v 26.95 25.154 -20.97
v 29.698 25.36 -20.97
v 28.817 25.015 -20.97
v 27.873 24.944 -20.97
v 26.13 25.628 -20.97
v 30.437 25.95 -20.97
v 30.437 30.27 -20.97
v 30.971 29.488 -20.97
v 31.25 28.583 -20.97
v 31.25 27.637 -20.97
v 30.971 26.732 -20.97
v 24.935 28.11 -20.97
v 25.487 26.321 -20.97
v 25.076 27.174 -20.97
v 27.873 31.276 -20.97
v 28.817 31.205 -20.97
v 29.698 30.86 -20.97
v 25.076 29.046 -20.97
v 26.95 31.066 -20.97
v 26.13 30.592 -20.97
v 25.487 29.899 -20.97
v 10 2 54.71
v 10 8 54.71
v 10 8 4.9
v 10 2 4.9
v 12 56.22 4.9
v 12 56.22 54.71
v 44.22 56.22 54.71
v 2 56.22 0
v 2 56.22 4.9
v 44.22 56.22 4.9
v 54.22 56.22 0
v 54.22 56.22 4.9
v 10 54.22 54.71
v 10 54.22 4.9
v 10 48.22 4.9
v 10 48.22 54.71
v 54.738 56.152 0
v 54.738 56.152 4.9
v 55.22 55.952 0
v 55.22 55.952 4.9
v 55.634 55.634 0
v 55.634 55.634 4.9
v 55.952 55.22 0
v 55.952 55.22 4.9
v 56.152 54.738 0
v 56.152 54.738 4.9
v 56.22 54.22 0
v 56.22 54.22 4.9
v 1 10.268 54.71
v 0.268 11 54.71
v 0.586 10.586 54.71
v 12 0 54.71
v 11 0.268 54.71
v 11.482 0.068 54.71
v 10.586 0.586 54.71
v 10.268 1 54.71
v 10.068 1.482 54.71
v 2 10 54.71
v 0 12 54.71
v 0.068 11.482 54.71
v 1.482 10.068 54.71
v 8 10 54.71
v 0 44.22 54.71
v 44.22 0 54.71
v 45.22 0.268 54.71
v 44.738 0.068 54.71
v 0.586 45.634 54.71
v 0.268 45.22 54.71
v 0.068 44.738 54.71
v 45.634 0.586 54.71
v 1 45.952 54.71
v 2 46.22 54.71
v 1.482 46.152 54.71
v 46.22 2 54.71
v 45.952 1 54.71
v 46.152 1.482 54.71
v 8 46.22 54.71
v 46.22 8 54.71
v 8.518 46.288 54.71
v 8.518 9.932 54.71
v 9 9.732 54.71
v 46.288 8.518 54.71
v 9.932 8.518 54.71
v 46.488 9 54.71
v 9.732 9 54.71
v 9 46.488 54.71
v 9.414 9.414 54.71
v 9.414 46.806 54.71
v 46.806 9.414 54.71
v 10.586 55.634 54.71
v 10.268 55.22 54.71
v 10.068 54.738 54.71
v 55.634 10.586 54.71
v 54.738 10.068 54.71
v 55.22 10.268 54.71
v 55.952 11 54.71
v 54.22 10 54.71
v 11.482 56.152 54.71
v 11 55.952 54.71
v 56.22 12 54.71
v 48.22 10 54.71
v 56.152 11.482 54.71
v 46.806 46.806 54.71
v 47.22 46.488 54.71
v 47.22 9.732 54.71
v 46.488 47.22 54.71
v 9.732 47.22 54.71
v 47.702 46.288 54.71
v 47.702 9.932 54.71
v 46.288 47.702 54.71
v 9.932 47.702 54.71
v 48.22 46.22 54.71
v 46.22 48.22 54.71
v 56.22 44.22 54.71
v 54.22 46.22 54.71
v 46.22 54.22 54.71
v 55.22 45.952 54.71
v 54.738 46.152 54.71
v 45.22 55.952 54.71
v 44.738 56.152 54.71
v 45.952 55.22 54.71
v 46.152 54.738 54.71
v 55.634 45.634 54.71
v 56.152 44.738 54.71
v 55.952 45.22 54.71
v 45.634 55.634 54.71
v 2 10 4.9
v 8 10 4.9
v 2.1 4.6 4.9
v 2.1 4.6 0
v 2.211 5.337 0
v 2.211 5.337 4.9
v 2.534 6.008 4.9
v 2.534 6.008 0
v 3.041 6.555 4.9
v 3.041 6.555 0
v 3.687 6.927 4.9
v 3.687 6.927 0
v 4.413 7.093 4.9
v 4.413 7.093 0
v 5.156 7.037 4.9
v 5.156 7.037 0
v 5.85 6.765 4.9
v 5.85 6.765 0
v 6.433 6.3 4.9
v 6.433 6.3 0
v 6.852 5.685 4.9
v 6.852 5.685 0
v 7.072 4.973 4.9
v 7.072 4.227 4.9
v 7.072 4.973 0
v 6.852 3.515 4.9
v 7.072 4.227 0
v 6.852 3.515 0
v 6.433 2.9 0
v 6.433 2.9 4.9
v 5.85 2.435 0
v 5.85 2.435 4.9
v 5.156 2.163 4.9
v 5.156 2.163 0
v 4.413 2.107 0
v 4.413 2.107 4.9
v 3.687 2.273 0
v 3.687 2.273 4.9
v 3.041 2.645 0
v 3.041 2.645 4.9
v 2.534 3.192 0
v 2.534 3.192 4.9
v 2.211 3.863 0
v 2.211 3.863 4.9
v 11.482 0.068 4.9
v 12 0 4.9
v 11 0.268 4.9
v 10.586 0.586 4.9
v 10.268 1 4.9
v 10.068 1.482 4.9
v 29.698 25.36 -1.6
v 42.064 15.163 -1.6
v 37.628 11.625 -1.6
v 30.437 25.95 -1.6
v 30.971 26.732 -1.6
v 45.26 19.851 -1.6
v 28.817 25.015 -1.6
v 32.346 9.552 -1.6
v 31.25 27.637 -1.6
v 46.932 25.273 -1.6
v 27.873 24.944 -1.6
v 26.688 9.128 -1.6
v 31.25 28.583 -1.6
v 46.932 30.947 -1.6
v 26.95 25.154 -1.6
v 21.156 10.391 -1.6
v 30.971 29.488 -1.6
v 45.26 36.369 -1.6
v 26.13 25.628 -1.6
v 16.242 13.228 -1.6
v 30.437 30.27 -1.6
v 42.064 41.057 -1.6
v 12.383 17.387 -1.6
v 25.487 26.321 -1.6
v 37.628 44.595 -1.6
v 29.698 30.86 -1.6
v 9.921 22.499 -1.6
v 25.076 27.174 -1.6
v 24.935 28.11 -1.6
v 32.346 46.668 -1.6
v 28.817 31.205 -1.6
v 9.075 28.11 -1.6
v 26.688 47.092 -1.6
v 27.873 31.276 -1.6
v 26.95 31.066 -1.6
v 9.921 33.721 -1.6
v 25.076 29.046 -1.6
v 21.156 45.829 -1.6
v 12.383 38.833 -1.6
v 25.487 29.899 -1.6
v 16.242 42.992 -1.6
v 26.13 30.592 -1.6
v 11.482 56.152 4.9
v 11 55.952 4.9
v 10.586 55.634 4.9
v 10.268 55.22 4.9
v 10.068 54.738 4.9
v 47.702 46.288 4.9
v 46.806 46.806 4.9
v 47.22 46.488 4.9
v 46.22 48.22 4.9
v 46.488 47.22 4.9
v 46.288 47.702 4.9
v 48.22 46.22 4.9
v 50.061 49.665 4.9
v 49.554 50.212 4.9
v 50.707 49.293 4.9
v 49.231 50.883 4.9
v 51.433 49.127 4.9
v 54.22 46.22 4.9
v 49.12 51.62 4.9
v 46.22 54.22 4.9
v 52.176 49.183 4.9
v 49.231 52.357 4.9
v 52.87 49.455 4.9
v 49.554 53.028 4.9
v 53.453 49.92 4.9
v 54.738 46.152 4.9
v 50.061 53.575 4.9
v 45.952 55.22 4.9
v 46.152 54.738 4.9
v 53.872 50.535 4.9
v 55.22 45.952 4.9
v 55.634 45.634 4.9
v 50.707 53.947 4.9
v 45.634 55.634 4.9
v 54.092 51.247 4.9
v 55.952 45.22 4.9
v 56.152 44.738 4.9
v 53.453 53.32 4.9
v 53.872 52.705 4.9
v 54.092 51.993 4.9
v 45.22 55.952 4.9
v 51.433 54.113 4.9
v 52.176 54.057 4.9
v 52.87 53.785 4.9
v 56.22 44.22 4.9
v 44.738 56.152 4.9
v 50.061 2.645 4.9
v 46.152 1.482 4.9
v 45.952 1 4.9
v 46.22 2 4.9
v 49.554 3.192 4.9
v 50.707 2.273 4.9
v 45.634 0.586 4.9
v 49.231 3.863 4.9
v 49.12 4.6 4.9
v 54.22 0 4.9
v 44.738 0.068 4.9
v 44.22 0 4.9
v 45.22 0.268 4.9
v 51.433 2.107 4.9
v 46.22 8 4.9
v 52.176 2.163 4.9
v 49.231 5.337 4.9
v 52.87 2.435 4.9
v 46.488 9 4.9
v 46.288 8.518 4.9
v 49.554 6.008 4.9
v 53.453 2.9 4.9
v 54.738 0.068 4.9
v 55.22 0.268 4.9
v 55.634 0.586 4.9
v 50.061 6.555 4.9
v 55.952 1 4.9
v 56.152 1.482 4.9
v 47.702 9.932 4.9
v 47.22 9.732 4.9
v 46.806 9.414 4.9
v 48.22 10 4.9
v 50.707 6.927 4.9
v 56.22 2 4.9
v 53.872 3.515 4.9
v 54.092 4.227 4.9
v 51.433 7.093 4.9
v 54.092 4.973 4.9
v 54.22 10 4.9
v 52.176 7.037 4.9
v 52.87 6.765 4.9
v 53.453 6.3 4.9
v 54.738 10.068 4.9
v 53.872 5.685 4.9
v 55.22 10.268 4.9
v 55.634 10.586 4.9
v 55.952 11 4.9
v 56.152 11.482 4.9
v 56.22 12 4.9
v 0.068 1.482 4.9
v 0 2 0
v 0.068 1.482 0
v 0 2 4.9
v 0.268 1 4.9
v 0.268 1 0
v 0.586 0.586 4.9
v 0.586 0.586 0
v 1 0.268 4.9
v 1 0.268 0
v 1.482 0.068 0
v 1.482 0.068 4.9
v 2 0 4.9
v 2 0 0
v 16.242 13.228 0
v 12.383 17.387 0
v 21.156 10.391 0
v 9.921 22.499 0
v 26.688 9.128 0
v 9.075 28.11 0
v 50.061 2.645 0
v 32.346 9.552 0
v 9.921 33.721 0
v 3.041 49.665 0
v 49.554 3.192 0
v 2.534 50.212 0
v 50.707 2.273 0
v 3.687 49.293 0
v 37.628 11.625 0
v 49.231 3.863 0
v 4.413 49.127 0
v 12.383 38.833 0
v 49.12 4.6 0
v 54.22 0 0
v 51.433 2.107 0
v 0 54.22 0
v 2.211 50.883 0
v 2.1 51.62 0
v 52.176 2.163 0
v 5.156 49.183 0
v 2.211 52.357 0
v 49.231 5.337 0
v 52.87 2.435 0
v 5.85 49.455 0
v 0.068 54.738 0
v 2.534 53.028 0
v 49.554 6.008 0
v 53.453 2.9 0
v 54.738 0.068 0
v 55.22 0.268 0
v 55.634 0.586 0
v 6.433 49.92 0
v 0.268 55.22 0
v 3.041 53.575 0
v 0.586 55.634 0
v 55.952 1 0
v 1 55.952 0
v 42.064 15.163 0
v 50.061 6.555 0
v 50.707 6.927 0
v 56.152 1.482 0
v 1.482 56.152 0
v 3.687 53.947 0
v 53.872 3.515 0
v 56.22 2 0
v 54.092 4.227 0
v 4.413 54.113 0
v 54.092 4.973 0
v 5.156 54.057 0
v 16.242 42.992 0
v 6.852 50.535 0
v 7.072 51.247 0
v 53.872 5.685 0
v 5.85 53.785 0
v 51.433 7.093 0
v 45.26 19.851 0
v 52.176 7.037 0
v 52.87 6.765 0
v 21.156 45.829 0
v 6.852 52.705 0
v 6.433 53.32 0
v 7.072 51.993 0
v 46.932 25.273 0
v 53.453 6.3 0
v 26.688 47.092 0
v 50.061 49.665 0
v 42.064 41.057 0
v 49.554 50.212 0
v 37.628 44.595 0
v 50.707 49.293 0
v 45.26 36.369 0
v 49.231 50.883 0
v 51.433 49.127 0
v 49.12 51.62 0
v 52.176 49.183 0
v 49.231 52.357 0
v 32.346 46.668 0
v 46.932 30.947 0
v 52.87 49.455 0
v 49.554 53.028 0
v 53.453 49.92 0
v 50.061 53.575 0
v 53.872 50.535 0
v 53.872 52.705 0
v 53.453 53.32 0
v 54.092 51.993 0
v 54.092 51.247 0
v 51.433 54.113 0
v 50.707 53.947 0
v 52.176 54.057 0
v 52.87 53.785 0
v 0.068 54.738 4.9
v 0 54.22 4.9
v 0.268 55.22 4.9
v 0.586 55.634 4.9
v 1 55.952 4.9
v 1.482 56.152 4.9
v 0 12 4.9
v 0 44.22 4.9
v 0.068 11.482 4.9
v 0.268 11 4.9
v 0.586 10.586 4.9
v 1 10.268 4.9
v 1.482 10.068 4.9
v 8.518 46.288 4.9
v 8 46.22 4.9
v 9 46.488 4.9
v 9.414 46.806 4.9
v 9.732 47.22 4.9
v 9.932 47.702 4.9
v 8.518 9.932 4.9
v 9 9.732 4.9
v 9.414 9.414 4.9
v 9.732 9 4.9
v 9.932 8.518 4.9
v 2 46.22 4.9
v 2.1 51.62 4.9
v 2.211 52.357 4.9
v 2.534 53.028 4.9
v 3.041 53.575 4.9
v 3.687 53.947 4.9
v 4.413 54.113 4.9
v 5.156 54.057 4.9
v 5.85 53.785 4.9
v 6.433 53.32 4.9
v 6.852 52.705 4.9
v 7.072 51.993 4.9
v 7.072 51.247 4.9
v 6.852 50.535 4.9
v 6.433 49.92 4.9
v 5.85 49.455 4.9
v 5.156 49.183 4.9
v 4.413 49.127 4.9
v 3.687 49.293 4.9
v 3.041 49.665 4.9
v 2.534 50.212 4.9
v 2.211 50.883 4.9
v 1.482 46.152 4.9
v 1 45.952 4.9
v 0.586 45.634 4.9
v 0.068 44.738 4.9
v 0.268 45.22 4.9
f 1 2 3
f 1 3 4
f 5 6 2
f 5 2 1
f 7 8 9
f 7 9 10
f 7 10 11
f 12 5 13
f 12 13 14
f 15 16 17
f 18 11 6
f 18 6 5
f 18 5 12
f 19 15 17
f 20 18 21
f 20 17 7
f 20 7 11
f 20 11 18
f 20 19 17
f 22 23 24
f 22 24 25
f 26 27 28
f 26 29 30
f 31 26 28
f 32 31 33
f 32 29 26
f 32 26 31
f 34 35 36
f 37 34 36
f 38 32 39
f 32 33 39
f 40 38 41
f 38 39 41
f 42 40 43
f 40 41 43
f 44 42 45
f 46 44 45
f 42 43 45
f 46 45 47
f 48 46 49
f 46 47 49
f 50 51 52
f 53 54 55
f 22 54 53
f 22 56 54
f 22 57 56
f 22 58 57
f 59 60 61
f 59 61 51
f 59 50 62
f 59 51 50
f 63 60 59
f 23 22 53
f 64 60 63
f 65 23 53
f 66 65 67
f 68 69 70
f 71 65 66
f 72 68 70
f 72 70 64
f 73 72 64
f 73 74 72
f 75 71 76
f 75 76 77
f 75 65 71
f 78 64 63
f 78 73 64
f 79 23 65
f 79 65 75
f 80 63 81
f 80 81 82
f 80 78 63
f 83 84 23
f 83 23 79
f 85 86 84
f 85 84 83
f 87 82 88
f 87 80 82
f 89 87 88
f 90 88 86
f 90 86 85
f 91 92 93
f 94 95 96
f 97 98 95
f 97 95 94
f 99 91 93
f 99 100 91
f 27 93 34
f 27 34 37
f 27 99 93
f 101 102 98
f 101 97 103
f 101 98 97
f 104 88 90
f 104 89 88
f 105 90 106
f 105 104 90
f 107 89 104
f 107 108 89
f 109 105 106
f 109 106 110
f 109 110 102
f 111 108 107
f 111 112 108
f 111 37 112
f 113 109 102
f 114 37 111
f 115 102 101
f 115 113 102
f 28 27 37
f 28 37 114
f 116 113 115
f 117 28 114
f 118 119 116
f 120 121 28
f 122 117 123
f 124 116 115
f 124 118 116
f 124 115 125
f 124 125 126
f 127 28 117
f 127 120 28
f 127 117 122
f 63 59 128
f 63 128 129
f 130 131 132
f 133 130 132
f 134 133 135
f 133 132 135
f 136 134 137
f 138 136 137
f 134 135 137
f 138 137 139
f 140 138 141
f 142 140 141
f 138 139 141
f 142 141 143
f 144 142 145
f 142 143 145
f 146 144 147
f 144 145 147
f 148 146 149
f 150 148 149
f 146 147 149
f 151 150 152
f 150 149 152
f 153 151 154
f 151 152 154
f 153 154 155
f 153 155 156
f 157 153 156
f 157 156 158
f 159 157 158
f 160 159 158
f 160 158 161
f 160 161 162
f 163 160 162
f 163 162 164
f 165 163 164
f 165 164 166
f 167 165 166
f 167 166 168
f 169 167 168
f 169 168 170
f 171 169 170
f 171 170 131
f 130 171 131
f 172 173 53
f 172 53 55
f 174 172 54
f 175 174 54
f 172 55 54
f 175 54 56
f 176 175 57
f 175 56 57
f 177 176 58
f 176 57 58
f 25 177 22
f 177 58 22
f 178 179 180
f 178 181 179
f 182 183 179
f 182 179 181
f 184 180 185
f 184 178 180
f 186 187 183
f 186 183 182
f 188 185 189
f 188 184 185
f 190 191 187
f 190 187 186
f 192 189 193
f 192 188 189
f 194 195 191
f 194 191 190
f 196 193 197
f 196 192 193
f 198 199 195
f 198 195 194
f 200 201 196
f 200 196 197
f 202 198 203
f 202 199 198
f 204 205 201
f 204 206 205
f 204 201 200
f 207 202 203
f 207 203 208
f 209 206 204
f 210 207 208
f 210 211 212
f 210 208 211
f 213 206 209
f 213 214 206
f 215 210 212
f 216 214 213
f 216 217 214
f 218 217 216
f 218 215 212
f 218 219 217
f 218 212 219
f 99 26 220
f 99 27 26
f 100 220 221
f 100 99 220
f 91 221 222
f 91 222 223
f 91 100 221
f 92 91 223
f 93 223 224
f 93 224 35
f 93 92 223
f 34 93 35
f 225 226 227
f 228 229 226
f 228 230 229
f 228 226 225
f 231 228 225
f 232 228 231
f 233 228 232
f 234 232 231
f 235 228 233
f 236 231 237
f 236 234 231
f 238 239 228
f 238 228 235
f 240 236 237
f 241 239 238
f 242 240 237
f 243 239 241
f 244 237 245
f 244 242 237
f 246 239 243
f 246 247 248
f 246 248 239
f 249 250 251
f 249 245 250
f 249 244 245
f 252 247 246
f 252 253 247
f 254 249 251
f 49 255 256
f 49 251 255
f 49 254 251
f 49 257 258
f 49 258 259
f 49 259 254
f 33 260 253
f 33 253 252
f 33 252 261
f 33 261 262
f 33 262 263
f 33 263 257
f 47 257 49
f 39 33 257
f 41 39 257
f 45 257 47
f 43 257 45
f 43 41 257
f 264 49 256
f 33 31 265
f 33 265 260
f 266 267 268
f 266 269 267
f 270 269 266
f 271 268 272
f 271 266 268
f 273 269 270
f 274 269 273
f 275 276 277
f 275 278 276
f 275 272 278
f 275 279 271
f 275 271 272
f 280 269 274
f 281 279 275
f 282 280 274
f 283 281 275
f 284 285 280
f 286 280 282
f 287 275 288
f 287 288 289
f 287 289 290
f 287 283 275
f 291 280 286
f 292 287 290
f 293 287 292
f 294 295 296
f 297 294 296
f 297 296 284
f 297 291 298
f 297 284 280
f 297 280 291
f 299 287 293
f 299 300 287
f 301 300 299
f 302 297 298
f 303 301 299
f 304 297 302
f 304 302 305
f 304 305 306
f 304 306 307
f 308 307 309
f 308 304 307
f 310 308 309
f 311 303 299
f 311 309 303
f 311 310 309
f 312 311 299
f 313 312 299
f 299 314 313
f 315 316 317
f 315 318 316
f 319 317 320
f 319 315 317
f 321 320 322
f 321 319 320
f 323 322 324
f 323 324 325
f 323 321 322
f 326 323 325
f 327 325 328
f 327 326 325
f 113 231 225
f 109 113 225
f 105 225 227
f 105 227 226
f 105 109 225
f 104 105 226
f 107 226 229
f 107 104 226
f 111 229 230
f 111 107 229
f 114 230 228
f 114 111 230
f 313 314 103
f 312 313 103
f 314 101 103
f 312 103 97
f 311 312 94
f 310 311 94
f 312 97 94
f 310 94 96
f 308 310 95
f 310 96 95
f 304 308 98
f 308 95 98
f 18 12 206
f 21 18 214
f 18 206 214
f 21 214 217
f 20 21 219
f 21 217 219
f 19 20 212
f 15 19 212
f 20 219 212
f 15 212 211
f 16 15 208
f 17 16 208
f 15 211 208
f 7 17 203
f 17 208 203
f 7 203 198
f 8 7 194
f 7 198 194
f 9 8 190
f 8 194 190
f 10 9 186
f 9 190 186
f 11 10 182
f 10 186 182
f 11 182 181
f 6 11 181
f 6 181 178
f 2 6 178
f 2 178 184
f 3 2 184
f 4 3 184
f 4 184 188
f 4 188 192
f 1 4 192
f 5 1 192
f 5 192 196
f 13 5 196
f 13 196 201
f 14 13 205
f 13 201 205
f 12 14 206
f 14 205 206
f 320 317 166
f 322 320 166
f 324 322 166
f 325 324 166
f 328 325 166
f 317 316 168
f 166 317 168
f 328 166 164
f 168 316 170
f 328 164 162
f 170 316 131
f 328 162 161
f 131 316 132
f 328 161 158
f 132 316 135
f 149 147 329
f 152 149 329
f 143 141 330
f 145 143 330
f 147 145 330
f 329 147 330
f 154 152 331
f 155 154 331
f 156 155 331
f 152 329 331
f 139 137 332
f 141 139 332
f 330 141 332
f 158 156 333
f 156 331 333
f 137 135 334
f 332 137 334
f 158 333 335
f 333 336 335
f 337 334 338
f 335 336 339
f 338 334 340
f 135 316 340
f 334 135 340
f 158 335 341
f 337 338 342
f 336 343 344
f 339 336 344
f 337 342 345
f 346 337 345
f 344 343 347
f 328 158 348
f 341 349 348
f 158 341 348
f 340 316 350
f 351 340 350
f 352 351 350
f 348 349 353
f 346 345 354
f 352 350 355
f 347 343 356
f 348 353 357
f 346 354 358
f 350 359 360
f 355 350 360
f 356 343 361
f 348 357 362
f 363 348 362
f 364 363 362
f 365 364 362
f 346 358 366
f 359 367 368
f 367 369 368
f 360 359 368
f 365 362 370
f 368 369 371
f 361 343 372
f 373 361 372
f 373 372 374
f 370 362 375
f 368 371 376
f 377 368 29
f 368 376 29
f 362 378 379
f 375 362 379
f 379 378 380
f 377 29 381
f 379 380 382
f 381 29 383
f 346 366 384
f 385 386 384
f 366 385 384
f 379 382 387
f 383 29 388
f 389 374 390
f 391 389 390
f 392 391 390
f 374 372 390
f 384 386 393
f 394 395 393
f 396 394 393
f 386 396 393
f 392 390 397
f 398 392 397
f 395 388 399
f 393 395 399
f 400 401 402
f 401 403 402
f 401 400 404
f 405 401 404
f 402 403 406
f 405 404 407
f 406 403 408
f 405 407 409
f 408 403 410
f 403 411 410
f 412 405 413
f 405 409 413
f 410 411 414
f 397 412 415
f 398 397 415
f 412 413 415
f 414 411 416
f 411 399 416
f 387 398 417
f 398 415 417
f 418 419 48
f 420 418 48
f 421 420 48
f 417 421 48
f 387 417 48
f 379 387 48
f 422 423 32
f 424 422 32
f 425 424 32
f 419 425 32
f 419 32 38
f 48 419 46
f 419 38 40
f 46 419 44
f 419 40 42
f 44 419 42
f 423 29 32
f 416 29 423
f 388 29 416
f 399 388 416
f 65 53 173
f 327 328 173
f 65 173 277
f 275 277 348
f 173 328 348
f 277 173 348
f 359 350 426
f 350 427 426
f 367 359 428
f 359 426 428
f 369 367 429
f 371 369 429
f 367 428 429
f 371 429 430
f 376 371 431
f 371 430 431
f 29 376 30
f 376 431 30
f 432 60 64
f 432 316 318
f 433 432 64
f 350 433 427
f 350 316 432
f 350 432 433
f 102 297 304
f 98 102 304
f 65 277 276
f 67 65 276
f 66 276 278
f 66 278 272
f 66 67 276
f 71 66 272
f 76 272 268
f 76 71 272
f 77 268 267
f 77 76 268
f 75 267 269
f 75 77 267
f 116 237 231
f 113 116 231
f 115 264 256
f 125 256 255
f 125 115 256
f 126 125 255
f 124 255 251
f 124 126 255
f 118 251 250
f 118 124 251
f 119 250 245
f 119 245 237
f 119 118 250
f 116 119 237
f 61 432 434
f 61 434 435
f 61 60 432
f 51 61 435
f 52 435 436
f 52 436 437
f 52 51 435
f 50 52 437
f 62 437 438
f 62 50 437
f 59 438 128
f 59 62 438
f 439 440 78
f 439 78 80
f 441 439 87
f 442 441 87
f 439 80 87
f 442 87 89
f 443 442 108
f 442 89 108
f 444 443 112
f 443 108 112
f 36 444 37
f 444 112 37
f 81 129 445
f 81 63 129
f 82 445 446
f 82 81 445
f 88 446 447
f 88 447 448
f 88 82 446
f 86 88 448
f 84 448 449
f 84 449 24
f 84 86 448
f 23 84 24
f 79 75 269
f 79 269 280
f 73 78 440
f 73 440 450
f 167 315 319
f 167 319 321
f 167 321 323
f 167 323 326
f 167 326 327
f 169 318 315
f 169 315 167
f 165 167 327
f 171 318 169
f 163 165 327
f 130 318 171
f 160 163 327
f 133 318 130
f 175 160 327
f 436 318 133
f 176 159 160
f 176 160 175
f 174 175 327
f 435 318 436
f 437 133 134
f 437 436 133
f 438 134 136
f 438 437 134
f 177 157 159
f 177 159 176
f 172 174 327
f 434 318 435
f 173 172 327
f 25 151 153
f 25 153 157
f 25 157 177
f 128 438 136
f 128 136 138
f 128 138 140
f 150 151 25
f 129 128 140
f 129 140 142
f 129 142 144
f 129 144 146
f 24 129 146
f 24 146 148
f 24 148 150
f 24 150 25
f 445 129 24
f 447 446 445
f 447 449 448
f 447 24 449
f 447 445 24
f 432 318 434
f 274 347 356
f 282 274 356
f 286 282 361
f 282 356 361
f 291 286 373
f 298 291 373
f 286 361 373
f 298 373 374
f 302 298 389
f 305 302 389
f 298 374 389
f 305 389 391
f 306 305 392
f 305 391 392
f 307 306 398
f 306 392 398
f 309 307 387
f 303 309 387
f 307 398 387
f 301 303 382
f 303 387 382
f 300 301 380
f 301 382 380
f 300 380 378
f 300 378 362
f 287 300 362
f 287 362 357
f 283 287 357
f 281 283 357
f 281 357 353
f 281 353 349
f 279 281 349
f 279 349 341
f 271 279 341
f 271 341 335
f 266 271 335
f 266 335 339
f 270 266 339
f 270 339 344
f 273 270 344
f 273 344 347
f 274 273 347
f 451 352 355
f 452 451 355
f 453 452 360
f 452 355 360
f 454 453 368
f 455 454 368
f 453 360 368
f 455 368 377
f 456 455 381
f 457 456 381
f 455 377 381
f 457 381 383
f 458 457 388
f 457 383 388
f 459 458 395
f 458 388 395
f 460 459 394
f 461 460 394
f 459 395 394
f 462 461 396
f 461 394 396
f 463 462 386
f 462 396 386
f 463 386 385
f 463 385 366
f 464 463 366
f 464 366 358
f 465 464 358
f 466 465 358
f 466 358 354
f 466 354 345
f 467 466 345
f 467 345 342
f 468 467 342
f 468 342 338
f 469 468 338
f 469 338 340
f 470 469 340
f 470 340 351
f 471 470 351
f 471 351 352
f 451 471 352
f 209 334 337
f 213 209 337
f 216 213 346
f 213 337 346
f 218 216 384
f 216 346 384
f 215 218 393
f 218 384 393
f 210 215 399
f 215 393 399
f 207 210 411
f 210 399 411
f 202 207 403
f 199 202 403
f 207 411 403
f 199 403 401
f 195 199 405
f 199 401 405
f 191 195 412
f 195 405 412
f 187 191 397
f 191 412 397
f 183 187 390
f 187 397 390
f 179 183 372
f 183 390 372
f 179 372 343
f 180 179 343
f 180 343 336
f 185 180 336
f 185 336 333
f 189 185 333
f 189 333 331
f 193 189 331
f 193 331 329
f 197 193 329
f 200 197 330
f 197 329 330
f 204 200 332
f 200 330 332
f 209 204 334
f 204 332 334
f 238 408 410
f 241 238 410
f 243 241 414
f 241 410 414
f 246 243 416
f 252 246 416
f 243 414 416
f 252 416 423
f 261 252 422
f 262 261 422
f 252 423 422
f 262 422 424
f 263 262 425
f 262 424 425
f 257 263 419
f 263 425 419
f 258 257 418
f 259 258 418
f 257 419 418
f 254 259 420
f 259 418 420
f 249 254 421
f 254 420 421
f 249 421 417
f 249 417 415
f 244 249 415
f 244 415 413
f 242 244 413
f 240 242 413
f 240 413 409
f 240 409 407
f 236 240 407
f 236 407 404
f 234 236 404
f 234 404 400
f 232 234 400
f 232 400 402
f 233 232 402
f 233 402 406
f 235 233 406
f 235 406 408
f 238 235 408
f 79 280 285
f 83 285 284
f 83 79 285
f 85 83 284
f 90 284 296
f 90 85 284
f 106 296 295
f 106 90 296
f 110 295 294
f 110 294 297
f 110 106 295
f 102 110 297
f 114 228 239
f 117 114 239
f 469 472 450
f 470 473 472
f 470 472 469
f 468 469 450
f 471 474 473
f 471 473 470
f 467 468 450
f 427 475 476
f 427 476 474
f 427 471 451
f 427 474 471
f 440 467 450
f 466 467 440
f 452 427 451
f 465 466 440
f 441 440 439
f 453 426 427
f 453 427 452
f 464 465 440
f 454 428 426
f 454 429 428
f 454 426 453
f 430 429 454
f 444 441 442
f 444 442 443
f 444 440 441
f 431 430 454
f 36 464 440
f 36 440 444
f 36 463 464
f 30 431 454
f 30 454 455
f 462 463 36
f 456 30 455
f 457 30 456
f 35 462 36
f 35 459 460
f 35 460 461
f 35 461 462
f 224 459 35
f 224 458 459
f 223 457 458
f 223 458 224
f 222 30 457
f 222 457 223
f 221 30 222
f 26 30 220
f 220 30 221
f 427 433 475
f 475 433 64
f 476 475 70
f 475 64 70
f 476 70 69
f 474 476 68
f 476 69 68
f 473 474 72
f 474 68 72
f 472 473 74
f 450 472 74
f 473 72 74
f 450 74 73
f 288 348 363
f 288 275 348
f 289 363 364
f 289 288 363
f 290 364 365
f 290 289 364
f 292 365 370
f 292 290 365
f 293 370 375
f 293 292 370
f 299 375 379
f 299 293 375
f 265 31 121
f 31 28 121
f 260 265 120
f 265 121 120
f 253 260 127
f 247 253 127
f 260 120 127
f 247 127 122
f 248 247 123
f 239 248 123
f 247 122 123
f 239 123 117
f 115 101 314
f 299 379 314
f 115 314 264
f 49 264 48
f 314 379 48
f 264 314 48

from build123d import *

# Parameters (mm, degrees)
SKETCH1_W           = 56.22
SKETCH1_H           = 56.22
BOSS_EXTRUDE1_DEPTH = 4.9
SKETCH2_R           = 2.5
CUT_EXTRUDE1_DEPTH  = 5.9
FILLET1_R           = 2
BOSS_EXTRUDE2_DEPTH = 49.81
FILLET2_R           = 2
SKETCH5_R           = 19.035
BOSS_EXTRUDE3_DEPTH = 1.6
SKETCH6_R           = 3.175
BOSS_EXTRUDE4_DEPTH = 19.37


with BuildPart() as part:
    # Sketch1 → Boss-Extrude1 (new body)
    with BuildSketch(Plane.XY):
        with Locations((28.11, 28.11)):
            Rectangle(SKETCH1_W, SKETCH1_H)
    extrude(amount=BOSS_EXTRUDE1_DEPTH)

    # Sketch2 → Cut-Extrude1 (cut, through all)
    with BuildSketch(Plane(origin=(0, 0, 0), x_dir=(-1, 0, 0), z_dir=(0, 0, -1))):
        with Locations((-4.6, 51.62)):
            Circle(SKETCH2_R)
        with Locations((-51.62, 51.62)):
            Circle(SKETCH2_R)
        with Locations((-51.62, 4.6)):
            Circle(SKETCH2_R)
        with Locations((-4.6, 4.6)):
            Circle(SKETCH2_R)
    extrude(amount=-CUT_EXTRUDE1_DEPTH, mode=Mode.SUBTRACT)

    # Fillet1
    fillet1_edges = [part.edges().sort_by_distance(p)[0] for p in [
        (0, 56.22, 2.45),
        (56.22, 56.22, 2.45),
        (56.22, 0, 2.45),
        (0, 0, 2.45),
    ]]
    fillet(fillet1_edges, radius=FILLET1_R)

    # Sketch4 → Boss-Extrude2 (add)
    with BuildSketch(Plane.XY.offset(4.9)):
        Polygon((0, 46.22), (0, 28.11), (28.11, 28.11), (28.11, 56.22), (10, 56.22), (10, 46.22), align=None)
        Polygon((28.11, 56.22), (28.11, 28.11), (56.22, 28.11), (56.22, 46.22), (46.22, 46.22), (46.22, 56.22), align=None)
        Polygon((56.22, 28.11), (28.11, 28.11), (28.11, 0), (46.22, 0), (46.22, 10), (56.22, 10), align=None)
        Polygon((28.11, 28.11), (0, 28.11), (0, 10), (10, 10), (10, 0), (28.11, 0), align=None)
    extrude(amount=BOSS_EXTRUDE2_DEPTH)

    # Fillet2
    fillet2_edges = [part.edges().sort_by_distance(p)[0] for p in [
        (10, 0, 29.805),
        (46.22, 0, 29.805),
        (46.22, 10, 29.805),
        (56.22, 10, 29.805),
        (56.22, 46.22, 29.805),
        (46.22, 46.22, 29.805),
        (46.22, 56.22, 29.805),
        (10, 56.22, 29.805),
        (10, 46.22, 29.805),
        (0, 46.22, 29.805),
        (0, 10, 29.805),
        (10, 10, 29.805),
    ]]
    fillet(fillet2_edges, radius=FILLET2_R)

    # Sketch5 → Boss-Extrude3 (add)
    with BuildSketch(Plane(origin=(0, 0, 0), x_dir=(-1, 0, 0), z_dir=(0, 0, -1))):
        with Locations((-28.11, 28.11)):
            Circle(SKETCH5_R)
    extrude(amount=BOSS_EXTRUDE3_DEPTH)

    # Sketch6 → Boss-Extrude4 (add)
    with BuildSketch(Plane(origin=(0, 0, -1.6), x_dir=(-1, 0, 0), z_dir=(0, 0, -1))):
        with Locations((-28.11, 28.11)):
            Circle(SKETCH6_R)
    extrude(amount=BOSS_EXTRUDE4_DEPTH)


solid = part.part
